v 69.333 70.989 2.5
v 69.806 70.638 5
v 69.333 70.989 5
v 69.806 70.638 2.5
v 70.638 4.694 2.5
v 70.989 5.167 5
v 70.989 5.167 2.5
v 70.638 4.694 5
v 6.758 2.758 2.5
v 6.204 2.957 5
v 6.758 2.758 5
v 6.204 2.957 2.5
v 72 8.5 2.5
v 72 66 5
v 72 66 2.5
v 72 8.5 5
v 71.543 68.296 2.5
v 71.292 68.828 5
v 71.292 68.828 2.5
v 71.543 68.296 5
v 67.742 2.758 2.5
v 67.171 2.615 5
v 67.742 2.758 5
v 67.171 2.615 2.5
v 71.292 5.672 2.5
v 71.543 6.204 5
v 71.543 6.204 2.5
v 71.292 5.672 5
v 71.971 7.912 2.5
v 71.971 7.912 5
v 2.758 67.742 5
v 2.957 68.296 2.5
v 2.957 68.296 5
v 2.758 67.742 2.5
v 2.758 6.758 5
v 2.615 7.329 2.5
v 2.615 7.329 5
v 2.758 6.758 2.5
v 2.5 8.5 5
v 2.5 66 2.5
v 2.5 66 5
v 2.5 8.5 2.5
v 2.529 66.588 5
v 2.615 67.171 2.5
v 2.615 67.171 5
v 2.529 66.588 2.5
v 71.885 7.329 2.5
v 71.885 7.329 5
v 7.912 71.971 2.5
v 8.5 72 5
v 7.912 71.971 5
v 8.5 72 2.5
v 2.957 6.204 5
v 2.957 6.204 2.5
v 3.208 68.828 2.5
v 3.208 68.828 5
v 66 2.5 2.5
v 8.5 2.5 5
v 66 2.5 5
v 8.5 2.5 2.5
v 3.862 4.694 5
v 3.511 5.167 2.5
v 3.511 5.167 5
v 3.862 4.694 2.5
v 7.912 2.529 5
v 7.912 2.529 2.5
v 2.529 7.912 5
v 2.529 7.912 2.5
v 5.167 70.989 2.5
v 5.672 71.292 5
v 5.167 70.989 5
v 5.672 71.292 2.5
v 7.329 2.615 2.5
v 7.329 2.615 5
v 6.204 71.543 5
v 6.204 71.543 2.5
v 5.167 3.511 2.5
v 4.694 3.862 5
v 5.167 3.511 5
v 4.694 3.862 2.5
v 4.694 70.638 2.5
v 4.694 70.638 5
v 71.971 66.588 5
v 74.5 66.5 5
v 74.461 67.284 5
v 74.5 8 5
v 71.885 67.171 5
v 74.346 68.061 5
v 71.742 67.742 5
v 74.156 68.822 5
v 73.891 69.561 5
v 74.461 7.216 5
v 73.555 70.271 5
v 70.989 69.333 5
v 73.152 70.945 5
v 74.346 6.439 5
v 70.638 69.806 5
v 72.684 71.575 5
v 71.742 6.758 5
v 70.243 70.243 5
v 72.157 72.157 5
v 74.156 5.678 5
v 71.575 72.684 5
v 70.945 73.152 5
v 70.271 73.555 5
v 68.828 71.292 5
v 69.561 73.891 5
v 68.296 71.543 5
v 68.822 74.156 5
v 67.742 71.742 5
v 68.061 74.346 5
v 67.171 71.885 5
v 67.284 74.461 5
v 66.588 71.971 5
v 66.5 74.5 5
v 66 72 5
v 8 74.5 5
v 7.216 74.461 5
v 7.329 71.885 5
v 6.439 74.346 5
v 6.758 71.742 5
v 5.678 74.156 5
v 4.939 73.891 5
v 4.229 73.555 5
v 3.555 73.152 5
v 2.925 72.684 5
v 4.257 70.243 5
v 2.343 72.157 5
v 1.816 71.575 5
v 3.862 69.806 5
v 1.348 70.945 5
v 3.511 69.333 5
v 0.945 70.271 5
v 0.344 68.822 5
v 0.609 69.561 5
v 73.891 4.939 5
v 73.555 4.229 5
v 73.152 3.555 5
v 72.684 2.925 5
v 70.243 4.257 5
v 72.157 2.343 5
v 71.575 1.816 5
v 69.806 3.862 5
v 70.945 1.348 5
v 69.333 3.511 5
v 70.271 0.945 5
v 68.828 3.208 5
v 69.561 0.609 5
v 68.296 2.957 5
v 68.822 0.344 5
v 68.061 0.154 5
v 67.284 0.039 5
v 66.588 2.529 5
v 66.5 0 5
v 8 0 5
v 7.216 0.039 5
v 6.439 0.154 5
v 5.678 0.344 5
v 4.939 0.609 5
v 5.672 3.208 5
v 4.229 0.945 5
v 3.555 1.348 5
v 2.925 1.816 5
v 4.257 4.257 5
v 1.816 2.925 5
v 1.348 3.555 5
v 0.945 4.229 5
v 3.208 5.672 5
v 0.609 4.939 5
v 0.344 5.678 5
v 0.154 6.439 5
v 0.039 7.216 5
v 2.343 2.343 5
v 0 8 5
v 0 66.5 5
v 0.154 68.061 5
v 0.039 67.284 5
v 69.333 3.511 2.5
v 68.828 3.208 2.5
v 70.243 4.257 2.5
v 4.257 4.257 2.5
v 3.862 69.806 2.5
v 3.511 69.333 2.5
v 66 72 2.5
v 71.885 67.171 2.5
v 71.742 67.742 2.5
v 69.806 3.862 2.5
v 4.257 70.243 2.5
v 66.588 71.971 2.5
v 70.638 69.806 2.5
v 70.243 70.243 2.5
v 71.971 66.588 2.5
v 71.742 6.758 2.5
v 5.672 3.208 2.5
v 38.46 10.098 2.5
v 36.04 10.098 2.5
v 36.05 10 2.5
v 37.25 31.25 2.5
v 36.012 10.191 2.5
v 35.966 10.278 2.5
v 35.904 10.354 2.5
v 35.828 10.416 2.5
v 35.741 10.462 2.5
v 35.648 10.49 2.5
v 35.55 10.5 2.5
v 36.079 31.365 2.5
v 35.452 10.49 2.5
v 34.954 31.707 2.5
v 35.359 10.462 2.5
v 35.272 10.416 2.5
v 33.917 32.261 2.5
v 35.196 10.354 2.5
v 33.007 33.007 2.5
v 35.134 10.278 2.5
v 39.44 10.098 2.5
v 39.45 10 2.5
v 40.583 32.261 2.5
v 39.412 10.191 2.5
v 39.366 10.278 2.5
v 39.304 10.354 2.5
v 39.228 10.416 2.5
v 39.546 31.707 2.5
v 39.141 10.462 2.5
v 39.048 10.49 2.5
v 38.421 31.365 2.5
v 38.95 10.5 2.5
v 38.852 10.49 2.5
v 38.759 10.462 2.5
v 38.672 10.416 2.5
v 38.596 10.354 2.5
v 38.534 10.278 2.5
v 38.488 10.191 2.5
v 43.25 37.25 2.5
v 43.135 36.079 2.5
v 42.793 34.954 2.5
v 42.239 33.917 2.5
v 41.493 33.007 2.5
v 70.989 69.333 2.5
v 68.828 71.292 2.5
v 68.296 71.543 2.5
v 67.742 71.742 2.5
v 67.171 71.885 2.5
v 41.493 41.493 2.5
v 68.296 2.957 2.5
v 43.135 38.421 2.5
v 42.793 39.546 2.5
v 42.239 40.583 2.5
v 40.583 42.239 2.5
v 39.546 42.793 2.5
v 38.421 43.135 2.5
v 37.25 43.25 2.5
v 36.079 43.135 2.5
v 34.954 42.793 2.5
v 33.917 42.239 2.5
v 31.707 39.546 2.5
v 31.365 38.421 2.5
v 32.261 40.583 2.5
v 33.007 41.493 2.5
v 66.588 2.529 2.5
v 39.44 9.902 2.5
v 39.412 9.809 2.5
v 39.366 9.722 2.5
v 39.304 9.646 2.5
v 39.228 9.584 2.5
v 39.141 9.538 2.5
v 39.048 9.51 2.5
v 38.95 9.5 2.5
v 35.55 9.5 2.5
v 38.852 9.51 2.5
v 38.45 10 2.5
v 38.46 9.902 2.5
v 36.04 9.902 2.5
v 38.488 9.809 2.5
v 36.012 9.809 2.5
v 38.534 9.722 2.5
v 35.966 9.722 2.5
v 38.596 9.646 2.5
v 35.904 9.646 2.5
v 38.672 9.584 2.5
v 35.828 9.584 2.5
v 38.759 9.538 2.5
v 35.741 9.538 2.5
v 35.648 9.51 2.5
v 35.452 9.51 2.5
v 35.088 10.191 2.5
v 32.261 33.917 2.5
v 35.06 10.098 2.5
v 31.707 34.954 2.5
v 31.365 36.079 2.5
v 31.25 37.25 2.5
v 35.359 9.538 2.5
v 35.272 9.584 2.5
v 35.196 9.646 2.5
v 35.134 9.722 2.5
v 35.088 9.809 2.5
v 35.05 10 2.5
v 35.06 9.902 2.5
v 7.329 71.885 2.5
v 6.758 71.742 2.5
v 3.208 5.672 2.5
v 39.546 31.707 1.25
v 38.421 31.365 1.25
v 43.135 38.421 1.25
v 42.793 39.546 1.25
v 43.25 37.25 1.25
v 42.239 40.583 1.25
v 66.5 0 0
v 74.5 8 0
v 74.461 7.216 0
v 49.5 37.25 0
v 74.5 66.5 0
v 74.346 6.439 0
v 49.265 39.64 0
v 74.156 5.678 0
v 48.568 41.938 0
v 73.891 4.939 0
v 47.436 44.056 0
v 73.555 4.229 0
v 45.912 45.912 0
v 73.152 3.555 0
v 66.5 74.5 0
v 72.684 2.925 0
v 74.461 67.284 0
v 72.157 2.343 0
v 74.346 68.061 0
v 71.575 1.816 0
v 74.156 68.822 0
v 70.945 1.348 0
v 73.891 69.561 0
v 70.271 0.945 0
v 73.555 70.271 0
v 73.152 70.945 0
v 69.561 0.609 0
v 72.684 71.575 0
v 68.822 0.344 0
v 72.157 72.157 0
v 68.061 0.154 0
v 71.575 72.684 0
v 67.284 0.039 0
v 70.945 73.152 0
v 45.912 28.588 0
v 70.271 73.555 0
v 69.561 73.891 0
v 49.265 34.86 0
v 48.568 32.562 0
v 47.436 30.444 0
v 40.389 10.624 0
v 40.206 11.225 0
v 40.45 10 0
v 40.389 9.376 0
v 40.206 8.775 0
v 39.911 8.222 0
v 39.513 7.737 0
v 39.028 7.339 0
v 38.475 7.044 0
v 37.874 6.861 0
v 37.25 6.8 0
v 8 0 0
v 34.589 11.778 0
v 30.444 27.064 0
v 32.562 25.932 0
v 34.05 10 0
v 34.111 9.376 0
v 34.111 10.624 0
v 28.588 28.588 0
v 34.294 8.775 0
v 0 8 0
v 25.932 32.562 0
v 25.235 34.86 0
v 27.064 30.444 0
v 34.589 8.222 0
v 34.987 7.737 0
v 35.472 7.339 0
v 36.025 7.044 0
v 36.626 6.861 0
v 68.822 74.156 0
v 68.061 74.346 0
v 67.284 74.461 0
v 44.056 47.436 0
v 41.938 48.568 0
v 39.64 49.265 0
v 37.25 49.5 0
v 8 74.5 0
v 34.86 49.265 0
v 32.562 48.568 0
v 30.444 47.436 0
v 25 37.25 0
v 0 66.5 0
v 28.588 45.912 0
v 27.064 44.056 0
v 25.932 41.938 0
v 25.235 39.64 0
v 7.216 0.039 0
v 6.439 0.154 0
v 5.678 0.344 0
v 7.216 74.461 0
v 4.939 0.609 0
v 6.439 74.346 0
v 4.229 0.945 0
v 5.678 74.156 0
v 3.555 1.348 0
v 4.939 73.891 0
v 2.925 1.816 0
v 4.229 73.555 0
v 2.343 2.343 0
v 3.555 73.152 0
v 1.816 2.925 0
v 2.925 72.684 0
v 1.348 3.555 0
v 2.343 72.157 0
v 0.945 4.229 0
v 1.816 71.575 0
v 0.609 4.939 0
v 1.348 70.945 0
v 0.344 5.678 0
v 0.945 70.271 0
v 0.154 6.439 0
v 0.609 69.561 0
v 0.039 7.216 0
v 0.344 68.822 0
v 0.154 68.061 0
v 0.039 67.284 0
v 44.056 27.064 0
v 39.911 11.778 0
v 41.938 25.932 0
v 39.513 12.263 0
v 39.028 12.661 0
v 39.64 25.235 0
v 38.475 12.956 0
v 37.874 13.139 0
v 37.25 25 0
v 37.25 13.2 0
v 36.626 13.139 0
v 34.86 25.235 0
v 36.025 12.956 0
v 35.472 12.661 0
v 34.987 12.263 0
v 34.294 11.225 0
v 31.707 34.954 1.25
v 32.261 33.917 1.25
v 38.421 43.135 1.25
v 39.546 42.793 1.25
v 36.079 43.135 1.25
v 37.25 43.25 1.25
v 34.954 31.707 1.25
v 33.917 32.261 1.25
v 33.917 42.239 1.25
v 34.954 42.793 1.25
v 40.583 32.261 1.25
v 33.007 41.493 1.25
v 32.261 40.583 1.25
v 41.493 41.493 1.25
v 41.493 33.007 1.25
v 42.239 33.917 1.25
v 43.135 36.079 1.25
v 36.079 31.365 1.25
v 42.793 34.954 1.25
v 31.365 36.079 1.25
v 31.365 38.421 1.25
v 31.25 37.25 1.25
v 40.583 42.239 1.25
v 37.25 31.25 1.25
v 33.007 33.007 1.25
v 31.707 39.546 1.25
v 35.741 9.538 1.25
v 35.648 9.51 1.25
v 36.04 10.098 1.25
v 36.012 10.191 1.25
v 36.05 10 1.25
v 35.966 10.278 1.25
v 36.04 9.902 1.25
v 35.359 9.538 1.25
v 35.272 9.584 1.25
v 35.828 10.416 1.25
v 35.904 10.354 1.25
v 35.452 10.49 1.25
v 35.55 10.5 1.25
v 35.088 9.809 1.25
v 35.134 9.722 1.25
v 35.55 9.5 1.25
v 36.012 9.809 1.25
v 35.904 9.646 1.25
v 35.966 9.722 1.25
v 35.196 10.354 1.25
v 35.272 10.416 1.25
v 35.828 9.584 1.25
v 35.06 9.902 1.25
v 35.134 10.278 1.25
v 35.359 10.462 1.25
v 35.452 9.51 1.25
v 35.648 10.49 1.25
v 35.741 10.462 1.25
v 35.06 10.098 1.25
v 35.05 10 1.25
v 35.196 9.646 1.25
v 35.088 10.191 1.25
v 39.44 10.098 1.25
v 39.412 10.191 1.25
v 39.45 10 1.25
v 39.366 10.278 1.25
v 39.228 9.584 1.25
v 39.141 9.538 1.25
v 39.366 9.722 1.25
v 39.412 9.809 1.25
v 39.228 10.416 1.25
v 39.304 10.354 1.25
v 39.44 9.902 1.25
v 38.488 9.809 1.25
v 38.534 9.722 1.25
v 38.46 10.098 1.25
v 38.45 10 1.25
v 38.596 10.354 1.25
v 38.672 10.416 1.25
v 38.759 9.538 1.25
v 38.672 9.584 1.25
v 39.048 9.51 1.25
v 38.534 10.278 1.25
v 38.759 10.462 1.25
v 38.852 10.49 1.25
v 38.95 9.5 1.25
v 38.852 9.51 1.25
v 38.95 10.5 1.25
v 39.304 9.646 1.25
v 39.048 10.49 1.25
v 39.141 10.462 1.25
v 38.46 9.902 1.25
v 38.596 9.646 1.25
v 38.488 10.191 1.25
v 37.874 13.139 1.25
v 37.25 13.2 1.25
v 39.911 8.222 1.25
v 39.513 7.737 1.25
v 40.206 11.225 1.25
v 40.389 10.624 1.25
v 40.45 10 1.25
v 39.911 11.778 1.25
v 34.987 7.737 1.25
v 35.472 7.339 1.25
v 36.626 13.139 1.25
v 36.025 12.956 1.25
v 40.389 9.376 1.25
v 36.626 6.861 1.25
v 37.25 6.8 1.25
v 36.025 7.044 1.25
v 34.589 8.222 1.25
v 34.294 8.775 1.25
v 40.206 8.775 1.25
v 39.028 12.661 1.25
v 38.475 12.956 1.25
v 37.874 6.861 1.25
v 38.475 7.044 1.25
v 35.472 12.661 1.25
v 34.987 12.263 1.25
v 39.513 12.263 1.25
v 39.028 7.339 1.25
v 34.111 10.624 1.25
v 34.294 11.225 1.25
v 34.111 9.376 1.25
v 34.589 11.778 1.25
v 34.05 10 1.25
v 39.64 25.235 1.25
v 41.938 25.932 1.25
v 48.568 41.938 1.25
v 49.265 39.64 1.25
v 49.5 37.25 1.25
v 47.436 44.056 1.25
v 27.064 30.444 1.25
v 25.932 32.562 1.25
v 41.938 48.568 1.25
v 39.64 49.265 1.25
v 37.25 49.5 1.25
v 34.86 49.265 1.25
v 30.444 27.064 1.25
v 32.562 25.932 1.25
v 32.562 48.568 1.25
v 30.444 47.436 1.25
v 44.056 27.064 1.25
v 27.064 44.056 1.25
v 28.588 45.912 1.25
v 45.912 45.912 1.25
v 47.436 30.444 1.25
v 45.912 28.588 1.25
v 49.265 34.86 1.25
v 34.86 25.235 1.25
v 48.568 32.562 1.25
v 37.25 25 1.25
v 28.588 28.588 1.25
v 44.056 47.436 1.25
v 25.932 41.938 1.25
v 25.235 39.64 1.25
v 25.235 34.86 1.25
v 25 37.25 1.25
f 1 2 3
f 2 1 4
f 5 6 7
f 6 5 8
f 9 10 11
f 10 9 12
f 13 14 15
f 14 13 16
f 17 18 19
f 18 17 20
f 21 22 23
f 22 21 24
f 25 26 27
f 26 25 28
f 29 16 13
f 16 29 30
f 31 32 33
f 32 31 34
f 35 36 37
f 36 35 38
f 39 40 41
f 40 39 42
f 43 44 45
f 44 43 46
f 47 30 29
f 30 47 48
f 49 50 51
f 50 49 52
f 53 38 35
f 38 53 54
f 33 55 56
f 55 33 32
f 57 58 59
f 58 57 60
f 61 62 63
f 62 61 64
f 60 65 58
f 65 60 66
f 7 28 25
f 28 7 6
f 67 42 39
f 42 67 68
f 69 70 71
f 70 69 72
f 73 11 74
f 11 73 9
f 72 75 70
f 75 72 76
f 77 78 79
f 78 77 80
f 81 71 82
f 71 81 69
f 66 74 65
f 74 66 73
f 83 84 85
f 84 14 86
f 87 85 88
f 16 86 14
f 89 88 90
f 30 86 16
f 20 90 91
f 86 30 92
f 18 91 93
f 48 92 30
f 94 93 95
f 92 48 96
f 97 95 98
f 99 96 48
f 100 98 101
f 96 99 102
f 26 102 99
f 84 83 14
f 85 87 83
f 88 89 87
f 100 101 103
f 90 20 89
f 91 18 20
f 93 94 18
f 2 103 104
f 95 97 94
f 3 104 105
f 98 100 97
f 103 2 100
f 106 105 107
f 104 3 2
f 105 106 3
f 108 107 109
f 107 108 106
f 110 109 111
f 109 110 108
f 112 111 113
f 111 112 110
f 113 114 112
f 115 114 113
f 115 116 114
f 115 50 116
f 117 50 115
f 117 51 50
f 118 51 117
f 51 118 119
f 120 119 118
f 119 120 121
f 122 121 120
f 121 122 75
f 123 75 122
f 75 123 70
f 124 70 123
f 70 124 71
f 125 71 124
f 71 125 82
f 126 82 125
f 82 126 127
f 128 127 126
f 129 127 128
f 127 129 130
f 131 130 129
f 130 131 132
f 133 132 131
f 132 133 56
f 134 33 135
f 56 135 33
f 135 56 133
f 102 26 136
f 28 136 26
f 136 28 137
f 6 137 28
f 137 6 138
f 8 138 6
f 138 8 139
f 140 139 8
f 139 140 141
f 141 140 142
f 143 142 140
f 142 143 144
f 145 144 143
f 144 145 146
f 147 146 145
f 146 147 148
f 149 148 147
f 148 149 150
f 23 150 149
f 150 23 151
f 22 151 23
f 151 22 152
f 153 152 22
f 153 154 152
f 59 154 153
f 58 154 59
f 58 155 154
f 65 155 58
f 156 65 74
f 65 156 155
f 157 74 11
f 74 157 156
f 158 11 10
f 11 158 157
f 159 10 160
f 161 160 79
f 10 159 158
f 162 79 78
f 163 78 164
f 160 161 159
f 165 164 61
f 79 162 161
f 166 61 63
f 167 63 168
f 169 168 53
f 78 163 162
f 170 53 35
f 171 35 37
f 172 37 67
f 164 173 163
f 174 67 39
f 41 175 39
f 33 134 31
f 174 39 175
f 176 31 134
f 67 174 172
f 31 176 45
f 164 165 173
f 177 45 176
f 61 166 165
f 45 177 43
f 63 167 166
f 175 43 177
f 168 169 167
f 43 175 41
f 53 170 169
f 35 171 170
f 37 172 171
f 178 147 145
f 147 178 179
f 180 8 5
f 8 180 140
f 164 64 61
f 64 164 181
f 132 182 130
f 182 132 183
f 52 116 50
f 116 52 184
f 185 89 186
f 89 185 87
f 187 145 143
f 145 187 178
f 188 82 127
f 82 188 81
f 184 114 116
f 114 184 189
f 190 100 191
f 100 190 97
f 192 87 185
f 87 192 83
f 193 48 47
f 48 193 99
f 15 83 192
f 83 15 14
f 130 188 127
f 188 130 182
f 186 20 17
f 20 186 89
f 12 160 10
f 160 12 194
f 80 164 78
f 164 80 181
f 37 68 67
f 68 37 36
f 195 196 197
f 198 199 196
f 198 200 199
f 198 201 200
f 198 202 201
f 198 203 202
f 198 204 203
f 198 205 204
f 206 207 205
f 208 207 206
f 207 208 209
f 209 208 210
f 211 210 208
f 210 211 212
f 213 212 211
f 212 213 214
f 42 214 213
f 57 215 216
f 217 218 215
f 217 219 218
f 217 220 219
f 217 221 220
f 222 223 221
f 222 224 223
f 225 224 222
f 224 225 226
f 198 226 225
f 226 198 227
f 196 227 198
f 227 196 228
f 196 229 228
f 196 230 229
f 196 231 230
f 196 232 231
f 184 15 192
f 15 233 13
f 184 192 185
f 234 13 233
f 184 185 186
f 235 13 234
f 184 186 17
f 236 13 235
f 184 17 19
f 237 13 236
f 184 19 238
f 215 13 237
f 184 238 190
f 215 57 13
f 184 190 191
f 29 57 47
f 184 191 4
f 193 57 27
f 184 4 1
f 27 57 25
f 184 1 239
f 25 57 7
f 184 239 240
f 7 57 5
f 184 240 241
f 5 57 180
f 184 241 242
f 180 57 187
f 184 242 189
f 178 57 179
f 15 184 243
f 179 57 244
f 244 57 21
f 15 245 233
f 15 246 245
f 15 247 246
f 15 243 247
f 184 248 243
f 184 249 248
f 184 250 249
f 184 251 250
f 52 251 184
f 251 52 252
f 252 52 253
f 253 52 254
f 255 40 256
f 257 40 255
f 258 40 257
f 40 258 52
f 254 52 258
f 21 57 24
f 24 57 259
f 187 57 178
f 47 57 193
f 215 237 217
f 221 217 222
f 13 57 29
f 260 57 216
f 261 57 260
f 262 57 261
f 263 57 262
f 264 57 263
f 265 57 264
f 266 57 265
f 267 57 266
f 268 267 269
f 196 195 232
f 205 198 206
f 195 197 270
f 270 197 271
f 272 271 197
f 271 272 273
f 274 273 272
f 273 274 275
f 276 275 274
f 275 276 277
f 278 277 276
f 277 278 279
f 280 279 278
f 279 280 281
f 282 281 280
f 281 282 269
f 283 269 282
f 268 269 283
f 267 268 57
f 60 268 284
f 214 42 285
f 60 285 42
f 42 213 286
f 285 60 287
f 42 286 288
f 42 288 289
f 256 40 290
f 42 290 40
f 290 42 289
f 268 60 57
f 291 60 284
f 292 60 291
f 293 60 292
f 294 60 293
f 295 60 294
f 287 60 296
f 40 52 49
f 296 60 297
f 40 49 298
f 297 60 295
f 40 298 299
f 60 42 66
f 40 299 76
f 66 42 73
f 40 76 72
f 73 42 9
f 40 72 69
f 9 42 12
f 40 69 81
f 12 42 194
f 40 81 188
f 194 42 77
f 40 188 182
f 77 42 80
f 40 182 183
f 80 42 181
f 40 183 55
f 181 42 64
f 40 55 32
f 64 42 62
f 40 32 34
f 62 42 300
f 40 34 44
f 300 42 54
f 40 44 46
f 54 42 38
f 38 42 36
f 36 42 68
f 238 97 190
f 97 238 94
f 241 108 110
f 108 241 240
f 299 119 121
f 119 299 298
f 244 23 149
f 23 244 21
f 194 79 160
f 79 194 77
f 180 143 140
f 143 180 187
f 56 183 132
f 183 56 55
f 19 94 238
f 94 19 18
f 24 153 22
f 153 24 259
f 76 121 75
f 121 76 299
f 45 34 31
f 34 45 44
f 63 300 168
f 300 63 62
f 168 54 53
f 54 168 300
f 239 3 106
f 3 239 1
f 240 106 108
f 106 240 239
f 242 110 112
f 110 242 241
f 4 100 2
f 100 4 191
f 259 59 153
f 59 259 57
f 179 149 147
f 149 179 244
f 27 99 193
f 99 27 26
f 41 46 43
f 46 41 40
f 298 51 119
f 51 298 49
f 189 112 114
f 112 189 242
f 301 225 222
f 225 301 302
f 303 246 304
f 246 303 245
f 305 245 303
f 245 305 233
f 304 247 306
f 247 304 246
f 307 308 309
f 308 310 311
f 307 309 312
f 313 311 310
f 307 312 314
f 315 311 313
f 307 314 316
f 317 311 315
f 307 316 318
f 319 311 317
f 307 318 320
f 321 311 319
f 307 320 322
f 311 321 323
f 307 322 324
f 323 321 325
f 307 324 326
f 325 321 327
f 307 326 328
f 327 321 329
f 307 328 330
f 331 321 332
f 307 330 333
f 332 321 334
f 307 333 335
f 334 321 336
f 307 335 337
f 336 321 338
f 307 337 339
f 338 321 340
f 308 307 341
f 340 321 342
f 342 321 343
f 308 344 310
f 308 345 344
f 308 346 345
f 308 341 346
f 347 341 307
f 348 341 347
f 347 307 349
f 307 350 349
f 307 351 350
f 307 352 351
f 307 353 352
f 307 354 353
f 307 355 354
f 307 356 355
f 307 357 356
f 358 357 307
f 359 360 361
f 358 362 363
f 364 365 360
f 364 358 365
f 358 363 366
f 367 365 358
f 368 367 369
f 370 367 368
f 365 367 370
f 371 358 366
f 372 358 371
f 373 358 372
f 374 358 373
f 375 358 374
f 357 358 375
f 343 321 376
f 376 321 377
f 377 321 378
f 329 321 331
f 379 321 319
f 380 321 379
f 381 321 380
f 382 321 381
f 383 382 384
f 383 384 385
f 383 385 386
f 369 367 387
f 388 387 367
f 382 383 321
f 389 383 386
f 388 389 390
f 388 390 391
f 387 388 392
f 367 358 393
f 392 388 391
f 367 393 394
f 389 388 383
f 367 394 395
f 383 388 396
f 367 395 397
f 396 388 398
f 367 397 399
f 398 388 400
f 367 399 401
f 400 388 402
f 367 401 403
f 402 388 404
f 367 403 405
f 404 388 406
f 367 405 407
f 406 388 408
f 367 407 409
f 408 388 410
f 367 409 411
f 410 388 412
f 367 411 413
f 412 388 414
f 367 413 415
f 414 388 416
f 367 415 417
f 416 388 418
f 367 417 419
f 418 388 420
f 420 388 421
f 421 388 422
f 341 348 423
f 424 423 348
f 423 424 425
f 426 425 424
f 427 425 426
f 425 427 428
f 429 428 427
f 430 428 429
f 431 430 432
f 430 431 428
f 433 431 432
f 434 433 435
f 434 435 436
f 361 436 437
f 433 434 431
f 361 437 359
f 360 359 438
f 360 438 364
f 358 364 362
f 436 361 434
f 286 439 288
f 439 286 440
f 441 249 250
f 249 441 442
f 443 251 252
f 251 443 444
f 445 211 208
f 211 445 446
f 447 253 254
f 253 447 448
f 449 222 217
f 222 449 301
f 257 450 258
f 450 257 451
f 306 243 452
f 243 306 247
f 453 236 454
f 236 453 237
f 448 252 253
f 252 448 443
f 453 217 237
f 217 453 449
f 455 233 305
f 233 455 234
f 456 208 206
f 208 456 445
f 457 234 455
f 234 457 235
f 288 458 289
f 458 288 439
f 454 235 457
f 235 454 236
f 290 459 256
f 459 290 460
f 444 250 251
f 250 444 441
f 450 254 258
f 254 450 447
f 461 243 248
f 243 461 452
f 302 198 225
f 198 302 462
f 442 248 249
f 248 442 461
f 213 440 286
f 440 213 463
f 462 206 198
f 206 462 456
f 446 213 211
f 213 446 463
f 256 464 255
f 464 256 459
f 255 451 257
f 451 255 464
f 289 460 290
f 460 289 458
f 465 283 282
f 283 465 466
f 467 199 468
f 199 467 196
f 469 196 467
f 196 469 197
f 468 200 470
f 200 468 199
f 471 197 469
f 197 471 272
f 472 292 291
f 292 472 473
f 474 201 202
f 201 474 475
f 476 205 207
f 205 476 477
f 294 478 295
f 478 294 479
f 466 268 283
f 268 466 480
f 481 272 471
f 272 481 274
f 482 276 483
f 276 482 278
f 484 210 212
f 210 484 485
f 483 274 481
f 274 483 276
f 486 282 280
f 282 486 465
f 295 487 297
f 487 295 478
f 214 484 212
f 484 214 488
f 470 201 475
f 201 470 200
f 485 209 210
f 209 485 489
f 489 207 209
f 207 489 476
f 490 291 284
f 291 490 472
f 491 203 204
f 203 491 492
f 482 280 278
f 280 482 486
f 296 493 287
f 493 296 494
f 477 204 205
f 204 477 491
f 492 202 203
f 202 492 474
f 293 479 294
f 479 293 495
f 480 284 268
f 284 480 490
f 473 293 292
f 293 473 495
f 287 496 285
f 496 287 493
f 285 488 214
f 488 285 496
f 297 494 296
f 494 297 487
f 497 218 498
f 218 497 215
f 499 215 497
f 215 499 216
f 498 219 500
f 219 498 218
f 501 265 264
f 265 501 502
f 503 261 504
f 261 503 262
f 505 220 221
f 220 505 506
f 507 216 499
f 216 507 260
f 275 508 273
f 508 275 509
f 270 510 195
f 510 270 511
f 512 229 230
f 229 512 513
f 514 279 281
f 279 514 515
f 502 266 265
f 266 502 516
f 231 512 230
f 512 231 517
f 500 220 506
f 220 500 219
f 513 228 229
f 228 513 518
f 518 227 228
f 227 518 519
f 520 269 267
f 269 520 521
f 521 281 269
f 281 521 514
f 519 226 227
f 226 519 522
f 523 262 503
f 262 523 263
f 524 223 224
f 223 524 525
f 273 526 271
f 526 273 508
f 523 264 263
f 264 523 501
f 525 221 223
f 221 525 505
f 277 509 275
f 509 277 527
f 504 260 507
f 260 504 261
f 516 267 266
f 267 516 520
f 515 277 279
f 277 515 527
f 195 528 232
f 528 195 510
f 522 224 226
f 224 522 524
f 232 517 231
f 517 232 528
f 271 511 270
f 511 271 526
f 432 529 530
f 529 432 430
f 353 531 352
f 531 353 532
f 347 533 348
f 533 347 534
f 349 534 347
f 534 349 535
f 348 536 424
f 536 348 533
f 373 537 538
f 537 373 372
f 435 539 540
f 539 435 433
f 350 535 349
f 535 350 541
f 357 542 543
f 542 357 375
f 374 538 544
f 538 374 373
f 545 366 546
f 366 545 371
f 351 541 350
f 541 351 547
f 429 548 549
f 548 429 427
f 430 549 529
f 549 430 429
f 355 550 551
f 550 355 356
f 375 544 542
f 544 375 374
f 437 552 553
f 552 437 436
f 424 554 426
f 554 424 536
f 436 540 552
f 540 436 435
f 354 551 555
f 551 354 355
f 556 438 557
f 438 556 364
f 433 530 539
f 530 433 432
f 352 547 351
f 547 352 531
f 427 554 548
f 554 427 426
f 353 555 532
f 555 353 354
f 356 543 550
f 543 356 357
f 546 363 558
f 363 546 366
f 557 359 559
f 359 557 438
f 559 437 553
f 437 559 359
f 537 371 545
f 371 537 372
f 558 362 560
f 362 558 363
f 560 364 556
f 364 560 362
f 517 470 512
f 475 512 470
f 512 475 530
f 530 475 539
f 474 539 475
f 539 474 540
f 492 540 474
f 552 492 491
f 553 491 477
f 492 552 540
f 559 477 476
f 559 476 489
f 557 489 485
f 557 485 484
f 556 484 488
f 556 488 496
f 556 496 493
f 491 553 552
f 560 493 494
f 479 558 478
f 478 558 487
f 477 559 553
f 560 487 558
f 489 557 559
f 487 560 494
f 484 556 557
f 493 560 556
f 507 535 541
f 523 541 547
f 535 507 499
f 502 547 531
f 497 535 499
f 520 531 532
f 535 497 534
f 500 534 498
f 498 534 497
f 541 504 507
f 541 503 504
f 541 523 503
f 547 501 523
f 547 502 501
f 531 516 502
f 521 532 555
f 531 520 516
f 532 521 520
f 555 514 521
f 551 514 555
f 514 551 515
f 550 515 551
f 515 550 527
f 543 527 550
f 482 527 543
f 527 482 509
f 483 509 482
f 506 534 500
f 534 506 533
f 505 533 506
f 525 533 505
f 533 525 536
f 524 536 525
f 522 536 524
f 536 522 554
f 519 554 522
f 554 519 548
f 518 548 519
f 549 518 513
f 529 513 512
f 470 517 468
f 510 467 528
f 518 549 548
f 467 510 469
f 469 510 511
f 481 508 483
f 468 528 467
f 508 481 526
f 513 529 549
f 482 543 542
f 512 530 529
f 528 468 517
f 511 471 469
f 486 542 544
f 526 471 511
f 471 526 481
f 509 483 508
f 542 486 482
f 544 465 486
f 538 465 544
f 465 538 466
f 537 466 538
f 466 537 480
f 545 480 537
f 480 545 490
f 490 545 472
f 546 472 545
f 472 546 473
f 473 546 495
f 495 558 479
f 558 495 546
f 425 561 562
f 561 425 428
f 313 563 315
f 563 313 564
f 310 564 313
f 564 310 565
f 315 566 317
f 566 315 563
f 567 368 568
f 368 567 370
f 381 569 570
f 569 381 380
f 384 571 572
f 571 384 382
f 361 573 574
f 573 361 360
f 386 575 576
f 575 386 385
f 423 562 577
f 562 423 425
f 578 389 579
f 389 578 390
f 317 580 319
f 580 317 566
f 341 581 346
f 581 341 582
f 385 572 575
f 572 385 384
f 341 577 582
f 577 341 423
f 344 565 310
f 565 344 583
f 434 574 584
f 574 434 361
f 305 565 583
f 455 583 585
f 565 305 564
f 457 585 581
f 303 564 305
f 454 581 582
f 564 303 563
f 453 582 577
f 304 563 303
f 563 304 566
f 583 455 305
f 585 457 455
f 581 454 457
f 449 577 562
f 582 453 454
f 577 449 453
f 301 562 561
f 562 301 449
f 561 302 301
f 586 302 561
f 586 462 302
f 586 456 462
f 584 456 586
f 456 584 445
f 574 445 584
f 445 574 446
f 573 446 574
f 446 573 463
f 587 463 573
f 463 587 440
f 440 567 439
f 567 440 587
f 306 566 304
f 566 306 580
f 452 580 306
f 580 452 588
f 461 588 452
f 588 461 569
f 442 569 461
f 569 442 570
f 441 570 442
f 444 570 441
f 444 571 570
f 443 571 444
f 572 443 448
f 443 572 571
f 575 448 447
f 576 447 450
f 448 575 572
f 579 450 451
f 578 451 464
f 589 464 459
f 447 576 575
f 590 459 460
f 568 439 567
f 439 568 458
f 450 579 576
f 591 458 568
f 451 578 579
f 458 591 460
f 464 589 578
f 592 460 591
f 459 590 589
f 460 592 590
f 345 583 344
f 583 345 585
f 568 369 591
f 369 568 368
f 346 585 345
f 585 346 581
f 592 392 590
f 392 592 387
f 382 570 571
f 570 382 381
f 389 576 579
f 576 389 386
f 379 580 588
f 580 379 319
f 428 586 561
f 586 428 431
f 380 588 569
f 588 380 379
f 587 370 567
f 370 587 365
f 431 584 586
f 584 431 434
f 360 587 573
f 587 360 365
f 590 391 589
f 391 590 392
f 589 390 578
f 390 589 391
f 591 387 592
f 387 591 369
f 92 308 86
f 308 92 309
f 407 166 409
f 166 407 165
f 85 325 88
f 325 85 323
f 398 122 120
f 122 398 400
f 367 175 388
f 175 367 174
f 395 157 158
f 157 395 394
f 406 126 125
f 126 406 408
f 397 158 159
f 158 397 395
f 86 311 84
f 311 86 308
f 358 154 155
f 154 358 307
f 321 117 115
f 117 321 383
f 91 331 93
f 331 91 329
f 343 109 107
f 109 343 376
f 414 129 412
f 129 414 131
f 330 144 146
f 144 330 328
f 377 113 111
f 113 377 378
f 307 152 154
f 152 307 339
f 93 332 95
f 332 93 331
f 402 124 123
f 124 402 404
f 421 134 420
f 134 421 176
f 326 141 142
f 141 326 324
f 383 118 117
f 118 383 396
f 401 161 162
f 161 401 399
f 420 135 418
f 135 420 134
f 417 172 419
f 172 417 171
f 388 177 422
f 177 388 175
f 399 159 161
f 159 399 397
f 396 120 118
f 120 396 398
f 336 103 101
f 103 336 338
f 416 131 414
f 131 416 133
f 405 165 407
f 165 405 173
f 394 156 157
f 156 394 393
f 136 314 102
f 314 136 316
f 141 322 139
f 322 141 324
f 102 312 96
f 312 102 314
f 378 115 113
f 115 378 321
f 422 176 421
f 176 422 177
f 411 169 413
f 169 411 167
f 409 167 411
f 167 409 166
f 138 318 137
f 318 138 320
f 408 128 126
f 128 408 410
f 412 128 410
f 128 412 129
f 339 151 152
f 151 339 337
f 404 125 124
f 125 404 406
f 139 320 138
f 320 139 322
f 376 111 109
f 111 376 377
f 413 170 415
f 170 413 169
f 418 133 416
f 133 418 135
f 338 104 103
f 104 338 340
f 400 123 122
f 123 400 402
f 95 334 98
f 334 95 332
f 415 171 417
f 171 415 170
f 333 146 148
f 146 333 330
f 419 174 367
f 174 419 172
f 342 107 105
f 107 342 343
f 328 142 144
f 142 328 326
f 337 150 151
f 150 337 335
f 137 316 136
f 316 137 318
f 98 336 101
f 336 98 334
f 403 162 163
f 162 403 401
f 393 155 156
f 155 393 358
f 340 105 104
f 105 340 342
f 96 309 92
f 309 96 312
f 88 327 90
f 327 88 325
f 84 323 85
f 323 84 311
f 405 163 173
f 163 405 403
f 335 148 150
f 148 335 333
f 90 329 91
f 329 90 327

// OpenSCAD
// file: dimensions.scad
wall_thickness = 2.5;

case_width = 80;
case_length = 80;
case_height = 80*1.618;

pcb_width = 48.5;
pcb_lenght = 45.25;

main_body_height = 80;
top_cover_height = 80*1.618-80;
// file: rounded_cube.scad
module rounded_cube(a,b,c,r){
    hull(){
        translate([r,r,0]) cylinder(r=r, h=c, $fn=64);
        translate([a-r,r,0]) cylinder(r=r, h=c, $fn=64);
        translate([a-r,b-r,0]) cylinder(r=r, h=c, $fn=64);
        translate([r,b-r,0]) cylinder(r=r, h=c, $fn=64);
    }
}
// main file
include <rounded_cube.scad>
include <dimensions.scad>

width = case_width-2*wall_thickness-0.5;
length = case_length-2*wall_thickness-0.5;

module led_holder_base(){
    rounded_cube(width,length,2*wall_thickness,8);
};

module led_holder_cuts(){
    translate([wall_thickness,wall_thickness,wall_thickness]) rounded_cube(width-2*wall_thickness,length-2*wall_thickness,wall_thickness,6);

    translate([(width)/2,(length)/2,0]) cylinder(r=6,h=wall_thickness,$fn=32);

    translate([(width)/2-3.4/2,10,0]) cylinder(r=1/2,h=wall_thickness,$fn=32);
    translate([(width)/2+3.4/2,10,0]) cylinder(r=1/2,h=wall_thickness,$fn=32);
    
    translate([(width)/2,10,0]) cylinder(r=6.4/2,h=wall_thickness/2,$fn=32);

    translate([(width)/2,(length)/2,0]) cylinder(r=24.5/2,h=wall_thickness/2,$fn=32);
};

module led_holder(){
    difference() {
        led_holder_base();
        led_holder_cuts();
    }
};

led_holder();
